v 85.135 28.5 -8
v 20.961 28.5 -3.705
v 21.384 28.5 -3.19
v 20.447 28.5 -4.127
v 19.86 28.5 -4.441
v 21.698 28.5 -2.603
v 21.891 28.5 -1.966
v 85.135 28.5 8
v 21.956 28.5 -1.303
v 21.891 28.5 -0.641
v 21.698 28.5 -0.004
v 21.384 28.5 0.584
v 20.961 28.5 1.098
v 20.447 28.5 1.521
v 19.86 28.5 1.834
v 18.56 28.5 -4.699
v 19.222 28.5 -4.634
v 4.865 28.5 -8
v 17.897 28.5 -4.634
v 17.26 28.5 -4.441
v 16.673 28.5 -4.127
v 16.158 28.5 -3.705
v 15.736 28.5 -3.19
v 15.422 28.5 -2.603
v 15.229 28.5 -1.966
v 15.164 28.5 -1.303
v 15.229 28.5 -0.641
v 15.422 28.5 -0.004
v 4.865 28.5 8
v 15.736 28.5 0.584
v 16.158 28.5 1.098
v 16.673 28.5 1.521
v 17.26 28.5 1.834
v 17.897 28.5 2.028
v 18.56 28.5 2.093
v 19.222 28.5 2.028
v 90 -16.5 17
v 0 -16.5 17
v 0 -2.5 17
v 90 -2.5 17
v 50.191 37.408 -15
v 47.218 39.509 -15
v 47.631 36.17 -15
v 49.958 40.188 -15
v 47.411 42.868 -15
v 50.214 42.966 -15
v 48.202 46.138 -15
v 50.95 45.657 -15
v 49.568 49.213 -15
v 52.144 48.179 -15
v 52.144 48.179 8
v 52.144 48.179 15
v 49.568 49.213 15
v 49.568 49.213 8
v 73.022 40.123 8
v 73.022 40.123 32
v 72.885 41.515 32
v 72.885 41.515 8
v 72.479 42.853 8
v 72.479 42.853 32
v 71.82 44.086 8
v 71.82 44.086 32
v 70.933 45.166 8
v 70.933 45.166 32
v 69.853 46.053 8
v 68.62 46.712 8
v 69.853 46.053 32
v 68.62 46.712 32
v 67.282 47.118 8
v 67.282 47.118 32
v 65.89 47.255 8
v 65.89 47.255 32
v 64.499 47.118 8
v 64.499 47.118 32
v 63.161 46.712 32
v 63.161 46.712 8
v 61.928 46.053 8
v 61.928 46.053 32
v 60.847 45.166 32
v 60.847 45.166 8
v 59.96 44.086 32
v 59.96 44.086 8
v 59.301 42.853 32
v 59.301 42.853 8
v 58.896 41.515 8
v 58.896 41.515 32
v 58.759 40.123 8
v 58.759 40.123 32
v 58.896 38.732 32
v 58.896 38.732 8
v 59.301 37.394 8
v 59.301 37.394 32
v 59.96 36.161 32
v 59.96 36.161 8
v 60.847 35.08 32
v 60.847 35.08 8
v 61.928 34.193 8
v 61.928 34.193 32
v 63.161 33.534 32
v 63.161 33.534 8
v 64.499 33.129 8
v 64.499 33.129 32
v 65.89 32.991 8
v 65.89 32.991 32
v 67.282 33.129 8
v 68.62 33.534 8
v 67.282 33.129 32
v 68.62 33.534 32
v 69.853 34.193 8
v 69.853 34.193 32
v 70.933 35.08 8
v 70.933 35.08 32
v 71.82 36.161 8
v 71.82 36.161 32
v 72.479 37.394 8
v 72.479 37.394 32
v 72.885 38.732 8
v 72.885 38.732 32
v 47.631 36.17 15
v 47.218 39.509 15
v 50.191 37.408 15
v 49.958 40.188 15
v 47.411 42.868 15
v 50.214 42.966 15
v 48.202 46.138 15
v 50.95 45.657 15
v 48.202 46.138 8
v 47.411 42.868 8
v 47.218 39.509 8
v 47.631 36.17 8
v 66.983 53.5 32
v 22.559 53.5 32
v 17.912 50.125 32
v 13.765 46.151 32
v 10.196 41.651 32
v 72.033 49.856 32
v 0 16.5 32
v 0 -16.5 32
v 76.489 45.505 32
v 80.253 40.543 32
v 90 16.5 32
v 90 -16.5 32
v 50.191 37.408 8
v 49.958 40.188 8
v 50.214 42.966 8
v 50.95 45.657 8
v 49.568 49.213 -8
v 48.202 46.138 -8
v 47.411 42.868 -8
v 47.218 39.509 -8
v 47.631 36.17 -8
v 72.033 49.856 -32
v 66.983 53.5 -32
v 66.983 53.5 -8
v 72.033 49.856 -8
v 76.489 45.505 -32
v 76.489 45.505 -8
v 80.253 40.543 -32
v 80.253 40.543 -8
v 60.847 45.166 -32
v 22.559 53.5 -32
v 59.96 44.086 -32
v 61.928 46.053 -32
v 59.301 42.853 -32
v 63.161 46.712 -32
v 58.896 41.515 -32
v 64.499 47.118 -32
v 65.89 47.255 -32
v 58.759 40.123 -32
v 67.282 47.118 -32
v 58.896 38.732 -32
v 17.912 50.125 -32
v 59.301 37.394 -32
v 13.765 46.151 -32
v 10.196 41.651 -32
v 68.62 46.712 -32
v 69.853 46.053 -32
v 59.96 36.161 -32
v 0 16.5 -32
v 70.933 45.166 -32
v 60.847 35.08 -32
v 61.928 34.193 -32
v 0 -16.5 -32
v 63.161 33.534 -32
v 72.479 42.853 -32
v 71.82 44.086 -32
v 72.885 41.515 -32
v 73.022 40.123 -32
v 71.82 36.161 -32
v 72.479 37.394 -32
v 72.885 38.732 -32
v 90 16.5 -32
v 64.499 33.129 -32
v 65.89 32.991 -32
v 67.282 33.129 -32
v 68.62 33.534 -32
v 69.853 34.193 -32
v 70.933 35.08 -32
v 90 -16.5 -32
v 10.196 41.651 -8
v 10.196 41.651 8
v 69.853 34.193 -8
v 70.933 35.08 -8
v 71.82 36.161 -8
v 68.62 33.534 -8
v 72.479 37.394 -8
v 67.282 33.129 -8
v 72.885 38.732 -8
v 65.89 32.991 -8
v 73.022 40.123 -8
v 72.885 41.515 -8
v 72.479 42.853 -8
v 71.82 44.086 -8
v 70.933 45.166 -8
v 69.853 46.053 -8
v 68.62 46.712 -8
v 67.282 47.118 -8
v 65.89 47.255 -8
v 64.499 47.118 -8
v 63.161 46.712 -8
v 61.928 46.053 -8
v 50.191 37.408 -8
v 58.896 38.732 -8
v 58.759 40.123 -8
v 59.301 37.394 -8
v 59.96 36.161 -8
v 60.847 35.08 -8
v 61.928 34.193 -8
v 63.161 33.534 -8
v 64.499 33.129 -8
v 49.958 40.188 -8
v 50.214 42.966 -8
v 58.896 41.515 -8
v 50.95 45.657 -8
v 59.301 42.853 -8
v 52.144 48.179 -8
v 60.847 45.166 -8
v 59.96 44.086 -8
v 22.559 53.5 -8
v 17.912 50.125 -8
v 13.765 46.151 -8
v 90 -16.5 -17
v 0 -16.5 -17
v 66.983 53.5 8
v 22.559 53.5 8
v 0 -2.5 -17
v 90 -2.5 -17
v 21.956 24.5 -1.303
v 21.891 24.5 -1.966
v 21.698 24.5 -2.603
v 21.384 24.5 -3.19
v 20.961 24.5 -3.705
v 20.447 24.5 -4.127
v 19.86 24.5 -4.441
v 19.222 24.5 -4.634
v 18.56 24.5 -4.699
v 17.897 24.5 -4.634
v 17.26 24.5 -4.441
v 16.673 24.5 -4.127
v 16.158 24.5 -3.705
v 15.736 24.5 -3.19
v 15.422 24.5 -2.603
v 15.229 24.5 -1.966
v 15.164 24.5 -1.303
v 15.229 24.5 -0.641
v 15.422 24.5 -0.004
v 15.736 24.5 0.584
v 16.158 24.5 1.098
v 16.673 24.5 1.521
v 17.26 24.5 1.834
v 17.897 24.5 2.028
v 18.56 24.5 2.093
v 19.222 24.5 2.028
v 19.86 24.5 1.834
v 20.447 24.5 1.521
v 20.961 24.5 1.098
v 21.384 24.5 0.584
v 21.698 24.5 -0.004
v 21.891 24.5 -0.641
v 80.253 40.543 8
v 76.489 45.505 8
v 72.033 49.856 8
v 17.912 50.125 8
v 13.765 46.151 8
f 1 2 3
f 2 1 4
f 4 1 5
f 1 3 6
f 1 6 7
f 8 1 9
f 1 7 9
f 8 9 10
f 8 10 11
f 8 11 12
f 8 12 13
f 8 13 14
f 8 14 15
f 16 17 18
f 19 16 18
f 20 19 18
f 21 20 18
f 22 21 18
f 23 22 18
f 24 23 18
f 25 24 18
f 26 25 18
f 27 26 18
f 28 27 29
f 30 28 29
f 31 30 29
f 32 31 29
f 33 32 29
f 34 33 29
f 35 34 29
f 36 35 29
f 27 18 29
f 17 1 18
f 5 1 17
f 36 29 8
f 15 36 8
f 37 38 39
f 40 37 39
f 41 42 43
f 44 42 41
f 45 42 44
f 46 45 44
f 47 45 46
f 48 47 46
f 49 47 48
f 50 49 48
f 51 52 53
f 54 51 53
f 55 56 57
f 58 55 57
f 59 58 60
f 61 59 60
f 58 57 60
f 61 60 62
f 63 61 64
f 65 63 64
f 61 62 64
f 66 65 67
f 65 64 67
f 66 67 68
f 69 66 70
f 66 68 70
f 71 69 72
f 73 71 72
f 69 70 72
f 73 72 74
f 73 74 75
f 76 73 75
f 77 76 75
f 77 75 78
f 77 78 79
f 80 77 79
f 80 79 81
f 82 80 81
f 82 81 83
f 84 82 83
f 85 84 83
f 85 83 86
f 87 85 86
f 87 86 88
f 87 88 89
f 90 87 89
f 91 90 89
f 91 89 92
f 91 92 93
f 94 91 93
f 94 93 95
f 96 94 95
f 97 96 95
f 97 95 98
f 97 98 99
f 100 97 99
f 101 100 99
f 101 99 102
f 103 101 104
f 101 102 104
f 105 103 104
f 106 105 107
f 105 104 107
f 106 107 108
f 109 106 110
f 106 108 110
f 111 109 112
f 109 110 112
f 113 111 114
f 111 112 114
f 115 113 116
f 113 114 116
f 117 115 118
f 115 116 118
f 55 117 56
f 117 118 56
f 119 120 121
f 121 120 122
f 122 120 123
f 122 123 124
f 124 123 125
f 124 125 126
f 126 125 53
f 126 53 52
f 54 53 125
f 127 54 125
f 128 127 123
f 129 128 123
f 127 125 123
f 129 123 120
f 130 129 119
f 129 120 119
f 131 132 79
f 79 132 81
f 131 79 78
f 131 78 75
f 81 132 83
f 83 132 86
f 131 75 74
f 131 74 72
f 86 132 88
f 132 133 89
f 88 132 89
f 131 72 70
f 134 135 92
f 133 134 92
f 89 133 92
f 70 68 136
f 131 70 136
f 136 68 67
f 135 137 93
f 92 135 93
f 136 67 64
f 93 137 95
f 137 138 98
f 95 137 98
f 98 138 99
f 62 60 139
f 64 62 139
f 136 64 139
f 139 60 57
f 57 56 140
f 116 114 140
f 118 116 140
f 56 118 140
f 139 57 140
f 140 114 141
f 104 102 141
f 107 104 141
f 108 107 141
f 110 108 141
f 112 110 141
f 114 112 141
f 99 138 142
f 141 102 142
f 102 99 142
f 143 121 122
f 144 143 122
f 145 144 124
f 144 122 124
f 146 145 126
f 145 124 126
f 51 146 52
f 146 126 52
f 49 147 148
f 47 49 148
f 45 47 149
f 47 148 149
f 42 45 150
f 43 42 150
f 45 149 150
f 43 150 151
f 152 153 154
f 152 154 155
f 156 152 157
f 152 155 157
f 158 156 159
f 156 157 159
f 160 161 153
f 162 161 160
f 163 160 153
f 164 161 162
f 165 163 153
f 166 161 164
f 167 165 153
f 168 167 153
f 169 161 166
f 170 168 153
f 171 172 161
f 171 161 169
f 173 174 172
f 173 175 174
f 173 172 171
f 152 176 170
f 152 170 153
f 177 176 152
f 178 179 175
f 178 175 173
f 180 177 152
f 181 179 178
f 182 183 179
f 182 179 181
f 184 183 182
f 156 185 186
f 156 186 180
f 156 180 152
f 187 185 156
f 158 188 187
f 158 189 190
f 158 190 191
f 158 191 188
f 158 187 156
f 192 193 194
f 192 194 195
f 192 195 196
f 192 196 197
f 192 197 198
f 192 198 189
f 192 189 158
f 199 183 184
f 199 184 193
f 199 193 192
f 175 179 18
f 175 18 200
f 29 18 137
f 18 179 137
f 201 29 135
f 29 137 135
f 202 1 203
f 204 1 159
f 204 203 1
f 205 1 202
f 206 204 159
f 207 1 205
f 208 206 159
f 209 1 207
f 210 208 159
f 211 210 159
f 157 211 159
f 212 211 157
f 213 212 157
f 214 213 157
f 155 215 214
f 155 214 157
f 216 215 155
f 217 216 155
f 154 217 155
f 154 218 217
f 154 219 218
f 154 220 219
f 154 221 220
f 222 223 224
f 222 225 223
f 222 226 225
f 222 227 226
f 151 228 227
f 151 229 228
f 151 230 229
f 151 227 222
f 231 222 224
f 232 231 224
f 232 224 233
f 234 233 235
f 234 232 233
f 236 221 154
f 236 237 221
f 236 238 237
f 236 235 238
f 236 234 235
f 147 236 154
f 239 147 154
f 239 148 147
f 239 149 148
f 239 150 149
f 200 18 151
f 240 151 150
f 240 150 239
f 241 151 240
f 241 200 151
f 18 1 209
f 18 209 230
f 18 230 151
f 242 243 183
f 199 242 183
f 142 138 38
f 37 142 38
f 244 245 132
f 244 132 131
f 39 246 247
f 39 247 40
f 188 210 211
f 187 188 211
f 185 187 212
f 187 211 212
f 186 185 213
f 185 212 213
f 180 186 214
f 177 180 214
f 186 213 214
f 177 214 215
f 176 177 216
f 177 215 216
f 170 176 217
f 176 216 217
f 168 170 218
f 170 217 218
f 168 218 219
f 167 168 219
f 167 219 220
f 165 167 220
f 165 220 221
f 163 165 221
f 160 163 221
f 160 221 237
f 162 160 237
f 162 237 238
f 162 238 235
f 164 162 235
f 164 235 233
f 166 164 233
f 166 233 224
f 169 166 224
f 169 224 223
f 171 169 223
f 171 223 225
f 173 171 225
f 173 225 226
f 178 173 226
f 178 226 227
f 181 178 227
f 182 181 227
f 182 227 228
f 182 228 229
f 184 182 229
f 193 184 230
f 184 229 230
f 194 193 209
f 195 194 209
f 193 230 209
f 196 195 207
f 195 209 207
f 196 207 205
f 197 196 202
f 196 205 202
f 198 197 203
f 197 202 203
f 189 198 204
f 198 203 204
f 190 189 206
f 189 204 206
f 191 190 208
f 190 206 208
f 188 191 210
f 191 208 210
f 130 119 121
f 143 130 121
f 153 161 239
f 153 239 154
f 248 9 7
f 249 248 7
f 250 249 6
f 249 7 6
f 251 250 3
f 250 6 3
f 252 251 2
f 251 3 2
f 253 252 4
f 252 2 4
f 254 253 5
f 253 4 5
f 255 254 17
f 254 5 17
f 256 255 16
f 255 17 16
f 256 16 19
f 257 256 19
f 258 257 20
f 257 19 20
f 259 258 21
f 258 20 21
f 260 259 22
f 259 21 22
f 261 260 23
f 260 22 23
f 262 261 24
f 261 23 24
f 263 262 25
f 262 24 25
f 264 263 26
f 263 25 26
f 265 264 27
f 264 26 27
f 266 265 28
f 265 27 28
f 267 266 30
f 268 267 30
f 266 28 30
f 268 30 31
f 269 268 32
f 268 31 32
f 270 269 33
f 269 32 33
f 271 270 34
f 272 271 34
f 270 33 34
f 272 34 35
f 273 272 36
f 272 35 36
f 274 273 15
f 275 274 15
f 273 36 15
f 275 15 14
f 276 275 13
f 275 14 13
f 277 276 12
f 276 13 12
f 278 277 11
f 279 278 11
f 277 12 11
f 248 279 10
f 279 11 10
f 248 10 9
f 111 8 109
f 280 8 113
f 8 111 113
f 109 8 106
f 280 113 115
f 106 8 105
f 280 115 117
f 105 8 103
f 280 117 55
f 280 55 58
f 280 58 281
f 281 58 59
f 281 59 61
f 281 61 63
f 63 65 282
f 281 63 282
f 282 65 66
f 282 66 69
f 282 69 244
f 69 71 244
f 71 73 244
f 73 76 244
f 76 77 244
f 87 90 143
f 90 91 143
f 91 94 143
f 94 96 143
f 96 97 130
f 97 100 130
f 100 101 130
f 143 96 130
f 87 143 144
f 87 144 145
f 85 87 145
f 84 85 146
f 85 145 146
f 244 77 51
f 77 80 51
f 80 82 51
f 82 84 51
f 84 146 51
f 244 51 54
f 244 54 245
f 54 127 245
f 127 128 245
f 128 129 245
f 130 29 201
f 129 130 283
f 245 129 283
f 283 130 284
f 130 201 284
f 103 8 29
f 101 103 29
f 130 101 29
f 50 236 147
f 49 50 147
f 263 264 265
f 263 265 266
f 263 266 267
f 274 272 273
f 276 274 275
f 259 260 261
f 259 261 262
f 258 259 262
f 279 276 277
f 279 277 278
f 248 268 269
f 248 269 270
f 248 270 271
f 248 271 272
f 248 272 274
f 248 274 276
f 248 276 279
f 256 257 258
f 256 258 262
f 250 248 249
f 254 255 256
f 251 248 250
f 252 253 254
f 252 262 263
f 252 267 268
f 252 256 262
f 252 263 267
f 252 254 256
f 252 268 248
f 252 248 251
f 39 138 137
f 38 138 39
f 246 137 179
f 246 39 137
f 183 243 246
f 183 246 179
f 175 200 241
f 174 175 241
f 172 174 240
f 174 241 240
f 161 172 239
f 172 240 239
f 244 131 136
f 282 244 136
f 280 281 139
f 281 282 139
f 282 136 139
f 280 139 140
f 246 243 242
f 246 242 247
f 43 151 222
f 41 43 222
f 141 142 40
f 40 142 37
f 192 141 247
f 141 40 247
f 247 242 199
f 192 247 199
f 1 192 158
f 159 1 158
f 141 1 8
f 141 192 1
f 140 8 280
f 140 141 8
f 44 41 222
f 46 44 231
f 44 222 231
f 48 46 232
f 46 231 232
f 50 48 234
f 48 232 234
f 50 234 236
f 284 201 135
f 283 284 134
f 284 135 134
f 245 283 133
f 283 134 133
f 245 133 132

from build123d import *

# Parameters (mm, degrees)
SKETCH1_W           = 64
SKETCH1_H           = 33
BOSS_EXTRUDE2_DEPTH = 90
SKETCH5_W           = 34
SKETCH5_H           = 14
CUT_EXTRUDE1_DEPTH  = 91
SKETCH7_W           = 90
SKETCH7_H           = 64
BOSS_EXTRUDE3_DEPTH = 37
SKETCH9_W           = 16
SKETCH9_H           = 25
CUT_EXTRUDE2_DEPTH  = 91
CUT_EXTRUDE3_DEPTH  = 65
CUT_EXTRUDE4_DEPTH  = 65
SKETCH12_R          = 4.563258517
CUT_EXTRUDE5_DEPTH  = 65
SKETCH13_R          = 3.396180785
CUT_EXTRUDE7_DEPTH  = 4
SKETCH14_R          = 7.131807436
CUT_EXTRUDE8_DEPTH  = 65
CUT_EXTRUDE9_START  = -17
CUT_EXTRUDE9_DEPTH  = 30


with BuildPart() as part:
    # Sketch1 → Boss-Extrude2 (new body)
    with BuildSketch(Plane(origin=(0, 0, 0), x_dir=(0, 0, -1), z_dir=(1, 0, 0))):
        Rectangle(SKETCH1_W, SKETCH1_H)
    extrude(amount=BOSS_EXTRUDE2_DEPTH)

    # Sketch5 → Cut-Extrude1 (cut, through all)
    with BuildSketch(Plane.ZY):
        with Locations((0, -9.5)):
            Rectangle(SKETCH5_W, SKETCH5_H)
    extrude(amount=-CUT_EXTRUDE1_DEPTH, mode=Mode.SUBTRACT)

    # Sketch7 → Boss-Extrude3 (add)
    with BuildSketch(Plane(origin=(0, 16.5, 0), x_dir=(1, 0, 0), z_dir=(0, 1, 0))):
        with Locations((45, 0)):
            Rectangle(SKETCH7_W, SKETCH7_H)
    extrude(amount=BOSS_EXTRUDE3_DEPTH)

    # Sketch9 → Cut-Extrude2 (cut, through all)
    with BuildSketch(Plane.ZY):
        with Locations((0, 41)):
            Rectangle(SKETCH9_W, SKETCH9_H)
    extrude(amount=-CUT_EXTRUDE2_DEPTH, mode=Mode.SUBTRACT)

    # Sketch10 → Cut-Extrude3 (cut, through all)
    with BuildSketch(Plane.XY.offset(32)):
        Polygon((0, 16.5), (15, 53.5), (0, 53.5), align=None)
        Polygon((90, 53.5), (90, 16.5), (75, 53.5), align=None)
    extrude(amount=-CUT_EXTRUDE3_DEPTH, mode=Mode.SUBTRACT)

    # Sketch11 → Cut-Extrude4 (cut, through all)
    with BuildSketch(Plane.XY.offset(32)):
        with BuildLine():
            Line((22.559269827, 53.5), (15, 53.5))
            Line((15, 53.5), (10.196218084, 41.650671273))
            ThreePointArc((10.196218084, 41.650671273), (15.770987206, 48.208398087), (22.559269827, 53.5))
        make_face()
        with BuildLine():
            Line((80.252850536, 40.542968678), (75, 53.5))
            Line((75, 53.5), (66.982723611, 53.5))
            ThreePointArc((66.982723611, 53.5), (74.341930784, 47.763126364), (80.252850536, 40.542968678))
        make_face()
    extrude(amount=-CUT_EXTRUDE4_DEPTH, mode=Mode.SUBTRACT)

    # Sketch12 → Cut-Extrude5 (cut, through all)
    with BuildSketch(Plane(origin=(0, 0, -32), x_dir=(-1, 0, 0), z_dir=(0, 0, -1))):
        with Locations((-65.890311292, 40.12330388)):
            Circle(SKETCH12_R)
    extrude(amount=-CUT_EXTRUDE5_DEPTH, mode=Mode.SUBTRACT)

    # Sketch13 → Cut-Extrude7 (cut)
    with BuildSketch(Plane(origin=(0, 28.5, 0), x_dir=(1, 0, 0), z_dir=(0, 1, 0))):
        with Locations((18.559847102, 1.303256126)):
            Circle(SKETCH13_R)
    extrude(amount=-CUT_EXTRUDE7_DEPTH, mode=Mode.SUBTRACT)

    # Sketch14 → Cut-Extrude8 (cut, through all)
    with BuildSketch(Plane.XY.offset(32)):
        with Locations((65.890311292, 40.12330388)):
            Circle(SKETCH14_R)
    extrude(amount=-CUT_EXTRUDE8_DEPTH, mode=Mode.SUBTRACT)

    # Sketch15 → Cut-Extrude9 (cut)
    with BuildSketch(Plane.XY.offset(32).offset(CUT_EXTRUDE9_START)):
        with BuildLine():
            Line((52.144239181, 48.178611287), (49.568050992, 49.212876474))
            ThreePointArc((49.568050992, 49.212876474), (47.410527131, 42.86813331), (47.630804887, 36.170211787))
            Line((47.630804887, 36.170211787), (50.191024462, 37.407632885))
            ThreePointArc((50.191024462, 37.407632885), (50.21355191, 42.966135424), (52.144239181, 48.178611287))
        make_face()
    extrude(amount=-CUT_EXTRUDE9_DEPTH, mode=Mode.SUBTRACT)


solid = part.part
